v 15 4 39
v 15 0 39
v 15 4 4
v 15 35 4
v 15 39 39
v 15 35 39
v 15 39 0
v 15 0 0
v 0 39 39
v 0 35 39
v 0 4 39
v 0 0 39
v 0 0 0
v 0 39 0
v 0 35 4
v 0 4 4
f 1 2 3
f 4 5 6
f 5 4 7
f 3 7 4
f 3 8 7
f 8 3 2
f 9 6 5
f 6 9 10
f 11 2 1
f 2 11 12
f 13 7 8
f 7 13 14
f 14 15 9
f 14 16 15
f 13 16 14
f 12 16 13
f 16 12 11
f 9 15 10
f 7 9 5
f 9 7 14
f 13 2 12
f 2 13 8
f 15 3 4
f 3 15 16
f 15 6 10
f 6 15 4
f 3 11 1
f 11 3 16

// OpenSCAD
fit = 1;
psuThickness = 30;
clipWidth = 15;
clipHeight = 35;
wallThickness = 4;

innerMeasurementX = psuThickness + fit;
outerMeasurementX = psuThickness + fit + 2 * wallThickness;
outerMeasurementZ = clipHeight + wallThickness;

difference() {
    cube([clipWidth,outerMeasurementX, outerMeasurementZ]);
    translate([-1, wallThickness, wallThickness]) cube([clipWidth + 2, innerMeasurementX, clipHeight + 1]);
}
